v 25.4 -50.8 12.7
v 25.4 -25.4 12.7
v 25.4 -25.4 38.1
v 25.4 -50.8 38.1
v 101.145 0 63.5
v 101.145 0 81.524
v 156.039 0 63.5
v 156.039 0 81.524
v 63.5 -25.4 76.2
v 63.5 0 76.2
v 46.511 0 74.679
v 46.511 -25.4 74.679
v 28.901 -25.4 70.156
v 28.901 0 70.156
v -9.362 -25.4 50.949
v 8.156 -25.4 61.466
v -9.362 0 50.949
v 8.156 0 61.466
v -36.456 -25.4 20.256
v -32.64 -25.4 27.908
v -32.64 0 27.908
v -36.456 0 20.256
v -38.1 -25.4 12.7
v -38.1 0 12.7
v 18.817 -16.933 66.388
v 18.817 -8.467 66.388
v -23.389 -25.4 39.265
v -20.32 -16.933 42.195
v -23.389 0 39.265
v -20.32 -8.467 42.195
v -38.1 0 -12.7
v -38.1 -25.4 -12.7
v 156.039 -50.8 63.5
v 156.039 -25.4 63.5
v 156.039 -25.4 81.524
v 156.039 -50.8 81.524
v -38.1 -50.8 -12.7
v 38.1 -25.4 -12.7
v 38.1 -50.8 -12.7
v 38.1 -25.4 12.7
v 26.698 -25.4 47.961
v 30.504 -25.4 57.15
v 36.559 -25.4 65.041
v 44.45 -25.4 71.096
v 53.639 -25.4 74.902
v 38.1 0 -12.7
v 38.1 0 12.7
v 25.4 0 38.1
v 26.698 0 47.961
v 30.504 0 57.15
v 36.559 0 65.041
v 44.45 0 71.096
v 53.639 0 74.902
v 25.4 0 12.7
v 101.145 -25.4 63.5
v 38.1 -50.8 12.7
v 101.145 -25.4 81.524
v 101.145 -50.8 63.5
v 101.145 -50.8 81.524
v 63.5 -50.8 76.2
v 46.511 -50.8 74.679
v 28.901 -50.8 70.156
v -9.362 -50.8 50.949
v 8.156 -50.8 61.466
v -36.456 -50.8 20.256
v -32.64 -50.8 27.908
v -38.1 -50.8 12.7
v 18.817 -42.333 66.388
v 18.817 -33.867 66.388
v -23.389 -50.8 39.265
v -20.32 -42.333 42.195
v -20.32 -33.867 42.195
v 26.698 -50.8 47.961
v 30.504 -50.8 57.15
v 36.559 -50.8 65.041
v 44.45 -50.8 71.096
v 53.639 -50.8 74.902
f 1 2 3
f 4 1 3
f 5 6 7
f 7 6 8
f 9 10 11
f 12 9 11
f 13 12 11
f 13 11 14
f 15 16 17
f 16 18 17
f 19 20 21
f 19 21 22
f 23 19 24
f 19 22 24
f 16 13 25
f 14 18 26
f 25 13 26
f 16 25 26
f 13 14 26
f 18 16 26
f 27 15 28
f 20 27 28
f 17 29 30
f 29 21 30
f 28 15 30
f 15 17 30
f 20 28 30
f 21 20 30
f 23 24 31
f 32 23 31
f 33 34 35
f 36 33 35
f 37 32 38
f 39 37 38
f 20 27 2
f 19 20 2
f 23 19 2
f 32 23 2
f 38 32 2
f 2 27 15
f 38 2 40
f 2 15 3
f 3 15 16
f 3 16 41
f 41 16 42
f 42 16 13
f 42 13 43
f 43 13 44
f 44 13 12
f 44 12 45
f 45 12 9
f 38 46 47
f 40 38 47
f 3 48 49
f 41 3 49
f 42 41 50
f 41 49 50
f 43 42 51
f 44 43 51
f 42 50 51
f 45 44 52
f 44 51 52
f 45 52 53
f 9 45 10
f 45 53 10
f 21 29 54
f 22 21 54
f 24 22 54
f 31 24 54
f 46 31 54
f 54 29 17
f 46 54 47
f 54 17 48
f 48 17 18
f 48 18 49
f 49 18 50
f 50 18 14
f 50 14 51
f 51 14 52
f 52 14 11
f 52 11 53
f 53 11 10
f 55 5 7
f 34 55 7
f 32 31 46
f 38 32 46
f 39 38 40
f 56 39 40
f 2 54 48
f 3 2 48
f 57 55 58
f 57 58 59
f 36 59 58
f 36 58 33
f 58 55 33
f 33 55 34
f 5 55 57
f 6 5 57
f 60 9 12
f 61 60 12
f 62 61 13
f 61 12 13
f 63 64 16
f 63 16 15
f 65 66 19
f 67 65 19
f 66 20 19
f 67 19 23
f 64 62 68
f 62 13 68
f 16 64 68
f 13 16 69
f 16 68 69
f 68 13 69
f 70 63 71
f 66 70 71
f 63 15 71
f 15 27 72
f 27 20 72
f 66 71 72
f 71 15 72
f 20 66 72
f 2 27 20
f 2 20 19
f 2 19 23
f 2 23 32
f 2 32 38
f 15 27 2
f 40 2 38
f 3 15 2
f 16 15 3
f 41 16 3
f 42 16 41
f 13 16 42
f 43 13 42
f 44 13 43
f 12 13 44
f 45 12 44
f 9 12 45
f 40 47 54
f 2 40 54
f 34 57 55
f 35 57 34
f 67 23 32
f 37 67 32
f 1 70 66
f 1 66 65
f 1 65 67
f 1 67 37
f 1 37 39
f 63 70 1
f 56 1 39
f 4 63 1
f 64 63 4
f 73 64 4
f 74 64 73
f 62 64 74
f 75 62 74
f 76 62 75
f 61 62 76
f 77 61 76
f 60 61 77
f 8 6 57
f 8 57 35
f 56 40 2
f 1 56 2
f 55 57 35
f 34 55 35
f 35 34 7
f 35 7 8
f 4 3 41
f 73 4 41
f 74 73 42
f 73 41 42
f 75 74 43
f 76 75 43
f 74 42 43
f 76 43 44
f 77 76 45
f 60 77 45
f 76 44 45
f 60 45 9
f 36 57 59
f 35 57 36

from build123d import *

# Parameters (mm, degrees)
F0_W      = 54.894862
F0_H      = 18.023853
F1_DEPTH  = 25.4
F1_FACE_W = 54.894862
F1_FACE_H = 18.023852
F2_DEPTH  = 25.4


with BuildPart() as f1:
    # F0 (on Front) → F1 (new body)
    with BuildSketch(Plane.XZ):
        with BuildLine():
            add(Edge.make_bspline(
                [(63.5, 76.2), (21.315021, 76.604232), (-36.269628, 41.819595), (-38.1, 12.7)],
                knots=[0, 0, 0, 0, 119.81156, 119.81156, 119.81156, 119.81156], degree=3))
            Line((-38.1, 12.7), (25.4, 12.7))
            Line((25.4, 12.7), (25.4, 38.1))
            ThreePointArc((25.4, 38.1), (36.559232, 65.040768), (63.5, 76.2))
        make_face()
        Polygon((-38.1, 12.7), (-38.1, -12.7), (38.1, -12.7), (38.1, 12.7), (25.4, 12.7), align=None)
        with Locations((128.592014, 72.511927)):
            Rectangle(F0_W, F0_H)
    extrude(amount=F1_DEPTH)


with BuildPart() as f2:
    # F1_face (on face) → F2 (new body)
    with BuildSketch(Plane(origin=(128.592014, -25.4, 72.511926), x_dir=(1, 0, 0), z_dir=(0, -1, 0))):
        Rectangle(F1_FACE_W, F1_FACE_H)
        with BuildLine():
            ThreePointArc((-103.192014, -34.411926), (-92.032783, -7.471158), (-65.092014, 3.688074))
            add(Edge.make_bspline(
                [(-65.092014, 3.688074), (-107.276993, 4.092306), (-164.861642, -30.692331), (-166.692014, -59.811926)],
                knots=[0, 0, 0, 0, 119.81156, 119.81156, 119.81156, 119.81156], degree=3))
            Line((-166.692014, -59.811926), (-166.692014, -85.211926))
            Line((-166.692014, -85.211926), (-90.492014, -85.211926))
            Line((-90.492014, -85.211926), (-90.492014, -59.811926))
            Line((-90.492014, -59.811926), (-103.192014, -59.811926))
            Line((-103.192014, -59.811926), (-103.192014, -34.411926))
        make_face()
    extrude(amount=F2_DEPTH)


solid = Compound([f1.part, f2.part])
